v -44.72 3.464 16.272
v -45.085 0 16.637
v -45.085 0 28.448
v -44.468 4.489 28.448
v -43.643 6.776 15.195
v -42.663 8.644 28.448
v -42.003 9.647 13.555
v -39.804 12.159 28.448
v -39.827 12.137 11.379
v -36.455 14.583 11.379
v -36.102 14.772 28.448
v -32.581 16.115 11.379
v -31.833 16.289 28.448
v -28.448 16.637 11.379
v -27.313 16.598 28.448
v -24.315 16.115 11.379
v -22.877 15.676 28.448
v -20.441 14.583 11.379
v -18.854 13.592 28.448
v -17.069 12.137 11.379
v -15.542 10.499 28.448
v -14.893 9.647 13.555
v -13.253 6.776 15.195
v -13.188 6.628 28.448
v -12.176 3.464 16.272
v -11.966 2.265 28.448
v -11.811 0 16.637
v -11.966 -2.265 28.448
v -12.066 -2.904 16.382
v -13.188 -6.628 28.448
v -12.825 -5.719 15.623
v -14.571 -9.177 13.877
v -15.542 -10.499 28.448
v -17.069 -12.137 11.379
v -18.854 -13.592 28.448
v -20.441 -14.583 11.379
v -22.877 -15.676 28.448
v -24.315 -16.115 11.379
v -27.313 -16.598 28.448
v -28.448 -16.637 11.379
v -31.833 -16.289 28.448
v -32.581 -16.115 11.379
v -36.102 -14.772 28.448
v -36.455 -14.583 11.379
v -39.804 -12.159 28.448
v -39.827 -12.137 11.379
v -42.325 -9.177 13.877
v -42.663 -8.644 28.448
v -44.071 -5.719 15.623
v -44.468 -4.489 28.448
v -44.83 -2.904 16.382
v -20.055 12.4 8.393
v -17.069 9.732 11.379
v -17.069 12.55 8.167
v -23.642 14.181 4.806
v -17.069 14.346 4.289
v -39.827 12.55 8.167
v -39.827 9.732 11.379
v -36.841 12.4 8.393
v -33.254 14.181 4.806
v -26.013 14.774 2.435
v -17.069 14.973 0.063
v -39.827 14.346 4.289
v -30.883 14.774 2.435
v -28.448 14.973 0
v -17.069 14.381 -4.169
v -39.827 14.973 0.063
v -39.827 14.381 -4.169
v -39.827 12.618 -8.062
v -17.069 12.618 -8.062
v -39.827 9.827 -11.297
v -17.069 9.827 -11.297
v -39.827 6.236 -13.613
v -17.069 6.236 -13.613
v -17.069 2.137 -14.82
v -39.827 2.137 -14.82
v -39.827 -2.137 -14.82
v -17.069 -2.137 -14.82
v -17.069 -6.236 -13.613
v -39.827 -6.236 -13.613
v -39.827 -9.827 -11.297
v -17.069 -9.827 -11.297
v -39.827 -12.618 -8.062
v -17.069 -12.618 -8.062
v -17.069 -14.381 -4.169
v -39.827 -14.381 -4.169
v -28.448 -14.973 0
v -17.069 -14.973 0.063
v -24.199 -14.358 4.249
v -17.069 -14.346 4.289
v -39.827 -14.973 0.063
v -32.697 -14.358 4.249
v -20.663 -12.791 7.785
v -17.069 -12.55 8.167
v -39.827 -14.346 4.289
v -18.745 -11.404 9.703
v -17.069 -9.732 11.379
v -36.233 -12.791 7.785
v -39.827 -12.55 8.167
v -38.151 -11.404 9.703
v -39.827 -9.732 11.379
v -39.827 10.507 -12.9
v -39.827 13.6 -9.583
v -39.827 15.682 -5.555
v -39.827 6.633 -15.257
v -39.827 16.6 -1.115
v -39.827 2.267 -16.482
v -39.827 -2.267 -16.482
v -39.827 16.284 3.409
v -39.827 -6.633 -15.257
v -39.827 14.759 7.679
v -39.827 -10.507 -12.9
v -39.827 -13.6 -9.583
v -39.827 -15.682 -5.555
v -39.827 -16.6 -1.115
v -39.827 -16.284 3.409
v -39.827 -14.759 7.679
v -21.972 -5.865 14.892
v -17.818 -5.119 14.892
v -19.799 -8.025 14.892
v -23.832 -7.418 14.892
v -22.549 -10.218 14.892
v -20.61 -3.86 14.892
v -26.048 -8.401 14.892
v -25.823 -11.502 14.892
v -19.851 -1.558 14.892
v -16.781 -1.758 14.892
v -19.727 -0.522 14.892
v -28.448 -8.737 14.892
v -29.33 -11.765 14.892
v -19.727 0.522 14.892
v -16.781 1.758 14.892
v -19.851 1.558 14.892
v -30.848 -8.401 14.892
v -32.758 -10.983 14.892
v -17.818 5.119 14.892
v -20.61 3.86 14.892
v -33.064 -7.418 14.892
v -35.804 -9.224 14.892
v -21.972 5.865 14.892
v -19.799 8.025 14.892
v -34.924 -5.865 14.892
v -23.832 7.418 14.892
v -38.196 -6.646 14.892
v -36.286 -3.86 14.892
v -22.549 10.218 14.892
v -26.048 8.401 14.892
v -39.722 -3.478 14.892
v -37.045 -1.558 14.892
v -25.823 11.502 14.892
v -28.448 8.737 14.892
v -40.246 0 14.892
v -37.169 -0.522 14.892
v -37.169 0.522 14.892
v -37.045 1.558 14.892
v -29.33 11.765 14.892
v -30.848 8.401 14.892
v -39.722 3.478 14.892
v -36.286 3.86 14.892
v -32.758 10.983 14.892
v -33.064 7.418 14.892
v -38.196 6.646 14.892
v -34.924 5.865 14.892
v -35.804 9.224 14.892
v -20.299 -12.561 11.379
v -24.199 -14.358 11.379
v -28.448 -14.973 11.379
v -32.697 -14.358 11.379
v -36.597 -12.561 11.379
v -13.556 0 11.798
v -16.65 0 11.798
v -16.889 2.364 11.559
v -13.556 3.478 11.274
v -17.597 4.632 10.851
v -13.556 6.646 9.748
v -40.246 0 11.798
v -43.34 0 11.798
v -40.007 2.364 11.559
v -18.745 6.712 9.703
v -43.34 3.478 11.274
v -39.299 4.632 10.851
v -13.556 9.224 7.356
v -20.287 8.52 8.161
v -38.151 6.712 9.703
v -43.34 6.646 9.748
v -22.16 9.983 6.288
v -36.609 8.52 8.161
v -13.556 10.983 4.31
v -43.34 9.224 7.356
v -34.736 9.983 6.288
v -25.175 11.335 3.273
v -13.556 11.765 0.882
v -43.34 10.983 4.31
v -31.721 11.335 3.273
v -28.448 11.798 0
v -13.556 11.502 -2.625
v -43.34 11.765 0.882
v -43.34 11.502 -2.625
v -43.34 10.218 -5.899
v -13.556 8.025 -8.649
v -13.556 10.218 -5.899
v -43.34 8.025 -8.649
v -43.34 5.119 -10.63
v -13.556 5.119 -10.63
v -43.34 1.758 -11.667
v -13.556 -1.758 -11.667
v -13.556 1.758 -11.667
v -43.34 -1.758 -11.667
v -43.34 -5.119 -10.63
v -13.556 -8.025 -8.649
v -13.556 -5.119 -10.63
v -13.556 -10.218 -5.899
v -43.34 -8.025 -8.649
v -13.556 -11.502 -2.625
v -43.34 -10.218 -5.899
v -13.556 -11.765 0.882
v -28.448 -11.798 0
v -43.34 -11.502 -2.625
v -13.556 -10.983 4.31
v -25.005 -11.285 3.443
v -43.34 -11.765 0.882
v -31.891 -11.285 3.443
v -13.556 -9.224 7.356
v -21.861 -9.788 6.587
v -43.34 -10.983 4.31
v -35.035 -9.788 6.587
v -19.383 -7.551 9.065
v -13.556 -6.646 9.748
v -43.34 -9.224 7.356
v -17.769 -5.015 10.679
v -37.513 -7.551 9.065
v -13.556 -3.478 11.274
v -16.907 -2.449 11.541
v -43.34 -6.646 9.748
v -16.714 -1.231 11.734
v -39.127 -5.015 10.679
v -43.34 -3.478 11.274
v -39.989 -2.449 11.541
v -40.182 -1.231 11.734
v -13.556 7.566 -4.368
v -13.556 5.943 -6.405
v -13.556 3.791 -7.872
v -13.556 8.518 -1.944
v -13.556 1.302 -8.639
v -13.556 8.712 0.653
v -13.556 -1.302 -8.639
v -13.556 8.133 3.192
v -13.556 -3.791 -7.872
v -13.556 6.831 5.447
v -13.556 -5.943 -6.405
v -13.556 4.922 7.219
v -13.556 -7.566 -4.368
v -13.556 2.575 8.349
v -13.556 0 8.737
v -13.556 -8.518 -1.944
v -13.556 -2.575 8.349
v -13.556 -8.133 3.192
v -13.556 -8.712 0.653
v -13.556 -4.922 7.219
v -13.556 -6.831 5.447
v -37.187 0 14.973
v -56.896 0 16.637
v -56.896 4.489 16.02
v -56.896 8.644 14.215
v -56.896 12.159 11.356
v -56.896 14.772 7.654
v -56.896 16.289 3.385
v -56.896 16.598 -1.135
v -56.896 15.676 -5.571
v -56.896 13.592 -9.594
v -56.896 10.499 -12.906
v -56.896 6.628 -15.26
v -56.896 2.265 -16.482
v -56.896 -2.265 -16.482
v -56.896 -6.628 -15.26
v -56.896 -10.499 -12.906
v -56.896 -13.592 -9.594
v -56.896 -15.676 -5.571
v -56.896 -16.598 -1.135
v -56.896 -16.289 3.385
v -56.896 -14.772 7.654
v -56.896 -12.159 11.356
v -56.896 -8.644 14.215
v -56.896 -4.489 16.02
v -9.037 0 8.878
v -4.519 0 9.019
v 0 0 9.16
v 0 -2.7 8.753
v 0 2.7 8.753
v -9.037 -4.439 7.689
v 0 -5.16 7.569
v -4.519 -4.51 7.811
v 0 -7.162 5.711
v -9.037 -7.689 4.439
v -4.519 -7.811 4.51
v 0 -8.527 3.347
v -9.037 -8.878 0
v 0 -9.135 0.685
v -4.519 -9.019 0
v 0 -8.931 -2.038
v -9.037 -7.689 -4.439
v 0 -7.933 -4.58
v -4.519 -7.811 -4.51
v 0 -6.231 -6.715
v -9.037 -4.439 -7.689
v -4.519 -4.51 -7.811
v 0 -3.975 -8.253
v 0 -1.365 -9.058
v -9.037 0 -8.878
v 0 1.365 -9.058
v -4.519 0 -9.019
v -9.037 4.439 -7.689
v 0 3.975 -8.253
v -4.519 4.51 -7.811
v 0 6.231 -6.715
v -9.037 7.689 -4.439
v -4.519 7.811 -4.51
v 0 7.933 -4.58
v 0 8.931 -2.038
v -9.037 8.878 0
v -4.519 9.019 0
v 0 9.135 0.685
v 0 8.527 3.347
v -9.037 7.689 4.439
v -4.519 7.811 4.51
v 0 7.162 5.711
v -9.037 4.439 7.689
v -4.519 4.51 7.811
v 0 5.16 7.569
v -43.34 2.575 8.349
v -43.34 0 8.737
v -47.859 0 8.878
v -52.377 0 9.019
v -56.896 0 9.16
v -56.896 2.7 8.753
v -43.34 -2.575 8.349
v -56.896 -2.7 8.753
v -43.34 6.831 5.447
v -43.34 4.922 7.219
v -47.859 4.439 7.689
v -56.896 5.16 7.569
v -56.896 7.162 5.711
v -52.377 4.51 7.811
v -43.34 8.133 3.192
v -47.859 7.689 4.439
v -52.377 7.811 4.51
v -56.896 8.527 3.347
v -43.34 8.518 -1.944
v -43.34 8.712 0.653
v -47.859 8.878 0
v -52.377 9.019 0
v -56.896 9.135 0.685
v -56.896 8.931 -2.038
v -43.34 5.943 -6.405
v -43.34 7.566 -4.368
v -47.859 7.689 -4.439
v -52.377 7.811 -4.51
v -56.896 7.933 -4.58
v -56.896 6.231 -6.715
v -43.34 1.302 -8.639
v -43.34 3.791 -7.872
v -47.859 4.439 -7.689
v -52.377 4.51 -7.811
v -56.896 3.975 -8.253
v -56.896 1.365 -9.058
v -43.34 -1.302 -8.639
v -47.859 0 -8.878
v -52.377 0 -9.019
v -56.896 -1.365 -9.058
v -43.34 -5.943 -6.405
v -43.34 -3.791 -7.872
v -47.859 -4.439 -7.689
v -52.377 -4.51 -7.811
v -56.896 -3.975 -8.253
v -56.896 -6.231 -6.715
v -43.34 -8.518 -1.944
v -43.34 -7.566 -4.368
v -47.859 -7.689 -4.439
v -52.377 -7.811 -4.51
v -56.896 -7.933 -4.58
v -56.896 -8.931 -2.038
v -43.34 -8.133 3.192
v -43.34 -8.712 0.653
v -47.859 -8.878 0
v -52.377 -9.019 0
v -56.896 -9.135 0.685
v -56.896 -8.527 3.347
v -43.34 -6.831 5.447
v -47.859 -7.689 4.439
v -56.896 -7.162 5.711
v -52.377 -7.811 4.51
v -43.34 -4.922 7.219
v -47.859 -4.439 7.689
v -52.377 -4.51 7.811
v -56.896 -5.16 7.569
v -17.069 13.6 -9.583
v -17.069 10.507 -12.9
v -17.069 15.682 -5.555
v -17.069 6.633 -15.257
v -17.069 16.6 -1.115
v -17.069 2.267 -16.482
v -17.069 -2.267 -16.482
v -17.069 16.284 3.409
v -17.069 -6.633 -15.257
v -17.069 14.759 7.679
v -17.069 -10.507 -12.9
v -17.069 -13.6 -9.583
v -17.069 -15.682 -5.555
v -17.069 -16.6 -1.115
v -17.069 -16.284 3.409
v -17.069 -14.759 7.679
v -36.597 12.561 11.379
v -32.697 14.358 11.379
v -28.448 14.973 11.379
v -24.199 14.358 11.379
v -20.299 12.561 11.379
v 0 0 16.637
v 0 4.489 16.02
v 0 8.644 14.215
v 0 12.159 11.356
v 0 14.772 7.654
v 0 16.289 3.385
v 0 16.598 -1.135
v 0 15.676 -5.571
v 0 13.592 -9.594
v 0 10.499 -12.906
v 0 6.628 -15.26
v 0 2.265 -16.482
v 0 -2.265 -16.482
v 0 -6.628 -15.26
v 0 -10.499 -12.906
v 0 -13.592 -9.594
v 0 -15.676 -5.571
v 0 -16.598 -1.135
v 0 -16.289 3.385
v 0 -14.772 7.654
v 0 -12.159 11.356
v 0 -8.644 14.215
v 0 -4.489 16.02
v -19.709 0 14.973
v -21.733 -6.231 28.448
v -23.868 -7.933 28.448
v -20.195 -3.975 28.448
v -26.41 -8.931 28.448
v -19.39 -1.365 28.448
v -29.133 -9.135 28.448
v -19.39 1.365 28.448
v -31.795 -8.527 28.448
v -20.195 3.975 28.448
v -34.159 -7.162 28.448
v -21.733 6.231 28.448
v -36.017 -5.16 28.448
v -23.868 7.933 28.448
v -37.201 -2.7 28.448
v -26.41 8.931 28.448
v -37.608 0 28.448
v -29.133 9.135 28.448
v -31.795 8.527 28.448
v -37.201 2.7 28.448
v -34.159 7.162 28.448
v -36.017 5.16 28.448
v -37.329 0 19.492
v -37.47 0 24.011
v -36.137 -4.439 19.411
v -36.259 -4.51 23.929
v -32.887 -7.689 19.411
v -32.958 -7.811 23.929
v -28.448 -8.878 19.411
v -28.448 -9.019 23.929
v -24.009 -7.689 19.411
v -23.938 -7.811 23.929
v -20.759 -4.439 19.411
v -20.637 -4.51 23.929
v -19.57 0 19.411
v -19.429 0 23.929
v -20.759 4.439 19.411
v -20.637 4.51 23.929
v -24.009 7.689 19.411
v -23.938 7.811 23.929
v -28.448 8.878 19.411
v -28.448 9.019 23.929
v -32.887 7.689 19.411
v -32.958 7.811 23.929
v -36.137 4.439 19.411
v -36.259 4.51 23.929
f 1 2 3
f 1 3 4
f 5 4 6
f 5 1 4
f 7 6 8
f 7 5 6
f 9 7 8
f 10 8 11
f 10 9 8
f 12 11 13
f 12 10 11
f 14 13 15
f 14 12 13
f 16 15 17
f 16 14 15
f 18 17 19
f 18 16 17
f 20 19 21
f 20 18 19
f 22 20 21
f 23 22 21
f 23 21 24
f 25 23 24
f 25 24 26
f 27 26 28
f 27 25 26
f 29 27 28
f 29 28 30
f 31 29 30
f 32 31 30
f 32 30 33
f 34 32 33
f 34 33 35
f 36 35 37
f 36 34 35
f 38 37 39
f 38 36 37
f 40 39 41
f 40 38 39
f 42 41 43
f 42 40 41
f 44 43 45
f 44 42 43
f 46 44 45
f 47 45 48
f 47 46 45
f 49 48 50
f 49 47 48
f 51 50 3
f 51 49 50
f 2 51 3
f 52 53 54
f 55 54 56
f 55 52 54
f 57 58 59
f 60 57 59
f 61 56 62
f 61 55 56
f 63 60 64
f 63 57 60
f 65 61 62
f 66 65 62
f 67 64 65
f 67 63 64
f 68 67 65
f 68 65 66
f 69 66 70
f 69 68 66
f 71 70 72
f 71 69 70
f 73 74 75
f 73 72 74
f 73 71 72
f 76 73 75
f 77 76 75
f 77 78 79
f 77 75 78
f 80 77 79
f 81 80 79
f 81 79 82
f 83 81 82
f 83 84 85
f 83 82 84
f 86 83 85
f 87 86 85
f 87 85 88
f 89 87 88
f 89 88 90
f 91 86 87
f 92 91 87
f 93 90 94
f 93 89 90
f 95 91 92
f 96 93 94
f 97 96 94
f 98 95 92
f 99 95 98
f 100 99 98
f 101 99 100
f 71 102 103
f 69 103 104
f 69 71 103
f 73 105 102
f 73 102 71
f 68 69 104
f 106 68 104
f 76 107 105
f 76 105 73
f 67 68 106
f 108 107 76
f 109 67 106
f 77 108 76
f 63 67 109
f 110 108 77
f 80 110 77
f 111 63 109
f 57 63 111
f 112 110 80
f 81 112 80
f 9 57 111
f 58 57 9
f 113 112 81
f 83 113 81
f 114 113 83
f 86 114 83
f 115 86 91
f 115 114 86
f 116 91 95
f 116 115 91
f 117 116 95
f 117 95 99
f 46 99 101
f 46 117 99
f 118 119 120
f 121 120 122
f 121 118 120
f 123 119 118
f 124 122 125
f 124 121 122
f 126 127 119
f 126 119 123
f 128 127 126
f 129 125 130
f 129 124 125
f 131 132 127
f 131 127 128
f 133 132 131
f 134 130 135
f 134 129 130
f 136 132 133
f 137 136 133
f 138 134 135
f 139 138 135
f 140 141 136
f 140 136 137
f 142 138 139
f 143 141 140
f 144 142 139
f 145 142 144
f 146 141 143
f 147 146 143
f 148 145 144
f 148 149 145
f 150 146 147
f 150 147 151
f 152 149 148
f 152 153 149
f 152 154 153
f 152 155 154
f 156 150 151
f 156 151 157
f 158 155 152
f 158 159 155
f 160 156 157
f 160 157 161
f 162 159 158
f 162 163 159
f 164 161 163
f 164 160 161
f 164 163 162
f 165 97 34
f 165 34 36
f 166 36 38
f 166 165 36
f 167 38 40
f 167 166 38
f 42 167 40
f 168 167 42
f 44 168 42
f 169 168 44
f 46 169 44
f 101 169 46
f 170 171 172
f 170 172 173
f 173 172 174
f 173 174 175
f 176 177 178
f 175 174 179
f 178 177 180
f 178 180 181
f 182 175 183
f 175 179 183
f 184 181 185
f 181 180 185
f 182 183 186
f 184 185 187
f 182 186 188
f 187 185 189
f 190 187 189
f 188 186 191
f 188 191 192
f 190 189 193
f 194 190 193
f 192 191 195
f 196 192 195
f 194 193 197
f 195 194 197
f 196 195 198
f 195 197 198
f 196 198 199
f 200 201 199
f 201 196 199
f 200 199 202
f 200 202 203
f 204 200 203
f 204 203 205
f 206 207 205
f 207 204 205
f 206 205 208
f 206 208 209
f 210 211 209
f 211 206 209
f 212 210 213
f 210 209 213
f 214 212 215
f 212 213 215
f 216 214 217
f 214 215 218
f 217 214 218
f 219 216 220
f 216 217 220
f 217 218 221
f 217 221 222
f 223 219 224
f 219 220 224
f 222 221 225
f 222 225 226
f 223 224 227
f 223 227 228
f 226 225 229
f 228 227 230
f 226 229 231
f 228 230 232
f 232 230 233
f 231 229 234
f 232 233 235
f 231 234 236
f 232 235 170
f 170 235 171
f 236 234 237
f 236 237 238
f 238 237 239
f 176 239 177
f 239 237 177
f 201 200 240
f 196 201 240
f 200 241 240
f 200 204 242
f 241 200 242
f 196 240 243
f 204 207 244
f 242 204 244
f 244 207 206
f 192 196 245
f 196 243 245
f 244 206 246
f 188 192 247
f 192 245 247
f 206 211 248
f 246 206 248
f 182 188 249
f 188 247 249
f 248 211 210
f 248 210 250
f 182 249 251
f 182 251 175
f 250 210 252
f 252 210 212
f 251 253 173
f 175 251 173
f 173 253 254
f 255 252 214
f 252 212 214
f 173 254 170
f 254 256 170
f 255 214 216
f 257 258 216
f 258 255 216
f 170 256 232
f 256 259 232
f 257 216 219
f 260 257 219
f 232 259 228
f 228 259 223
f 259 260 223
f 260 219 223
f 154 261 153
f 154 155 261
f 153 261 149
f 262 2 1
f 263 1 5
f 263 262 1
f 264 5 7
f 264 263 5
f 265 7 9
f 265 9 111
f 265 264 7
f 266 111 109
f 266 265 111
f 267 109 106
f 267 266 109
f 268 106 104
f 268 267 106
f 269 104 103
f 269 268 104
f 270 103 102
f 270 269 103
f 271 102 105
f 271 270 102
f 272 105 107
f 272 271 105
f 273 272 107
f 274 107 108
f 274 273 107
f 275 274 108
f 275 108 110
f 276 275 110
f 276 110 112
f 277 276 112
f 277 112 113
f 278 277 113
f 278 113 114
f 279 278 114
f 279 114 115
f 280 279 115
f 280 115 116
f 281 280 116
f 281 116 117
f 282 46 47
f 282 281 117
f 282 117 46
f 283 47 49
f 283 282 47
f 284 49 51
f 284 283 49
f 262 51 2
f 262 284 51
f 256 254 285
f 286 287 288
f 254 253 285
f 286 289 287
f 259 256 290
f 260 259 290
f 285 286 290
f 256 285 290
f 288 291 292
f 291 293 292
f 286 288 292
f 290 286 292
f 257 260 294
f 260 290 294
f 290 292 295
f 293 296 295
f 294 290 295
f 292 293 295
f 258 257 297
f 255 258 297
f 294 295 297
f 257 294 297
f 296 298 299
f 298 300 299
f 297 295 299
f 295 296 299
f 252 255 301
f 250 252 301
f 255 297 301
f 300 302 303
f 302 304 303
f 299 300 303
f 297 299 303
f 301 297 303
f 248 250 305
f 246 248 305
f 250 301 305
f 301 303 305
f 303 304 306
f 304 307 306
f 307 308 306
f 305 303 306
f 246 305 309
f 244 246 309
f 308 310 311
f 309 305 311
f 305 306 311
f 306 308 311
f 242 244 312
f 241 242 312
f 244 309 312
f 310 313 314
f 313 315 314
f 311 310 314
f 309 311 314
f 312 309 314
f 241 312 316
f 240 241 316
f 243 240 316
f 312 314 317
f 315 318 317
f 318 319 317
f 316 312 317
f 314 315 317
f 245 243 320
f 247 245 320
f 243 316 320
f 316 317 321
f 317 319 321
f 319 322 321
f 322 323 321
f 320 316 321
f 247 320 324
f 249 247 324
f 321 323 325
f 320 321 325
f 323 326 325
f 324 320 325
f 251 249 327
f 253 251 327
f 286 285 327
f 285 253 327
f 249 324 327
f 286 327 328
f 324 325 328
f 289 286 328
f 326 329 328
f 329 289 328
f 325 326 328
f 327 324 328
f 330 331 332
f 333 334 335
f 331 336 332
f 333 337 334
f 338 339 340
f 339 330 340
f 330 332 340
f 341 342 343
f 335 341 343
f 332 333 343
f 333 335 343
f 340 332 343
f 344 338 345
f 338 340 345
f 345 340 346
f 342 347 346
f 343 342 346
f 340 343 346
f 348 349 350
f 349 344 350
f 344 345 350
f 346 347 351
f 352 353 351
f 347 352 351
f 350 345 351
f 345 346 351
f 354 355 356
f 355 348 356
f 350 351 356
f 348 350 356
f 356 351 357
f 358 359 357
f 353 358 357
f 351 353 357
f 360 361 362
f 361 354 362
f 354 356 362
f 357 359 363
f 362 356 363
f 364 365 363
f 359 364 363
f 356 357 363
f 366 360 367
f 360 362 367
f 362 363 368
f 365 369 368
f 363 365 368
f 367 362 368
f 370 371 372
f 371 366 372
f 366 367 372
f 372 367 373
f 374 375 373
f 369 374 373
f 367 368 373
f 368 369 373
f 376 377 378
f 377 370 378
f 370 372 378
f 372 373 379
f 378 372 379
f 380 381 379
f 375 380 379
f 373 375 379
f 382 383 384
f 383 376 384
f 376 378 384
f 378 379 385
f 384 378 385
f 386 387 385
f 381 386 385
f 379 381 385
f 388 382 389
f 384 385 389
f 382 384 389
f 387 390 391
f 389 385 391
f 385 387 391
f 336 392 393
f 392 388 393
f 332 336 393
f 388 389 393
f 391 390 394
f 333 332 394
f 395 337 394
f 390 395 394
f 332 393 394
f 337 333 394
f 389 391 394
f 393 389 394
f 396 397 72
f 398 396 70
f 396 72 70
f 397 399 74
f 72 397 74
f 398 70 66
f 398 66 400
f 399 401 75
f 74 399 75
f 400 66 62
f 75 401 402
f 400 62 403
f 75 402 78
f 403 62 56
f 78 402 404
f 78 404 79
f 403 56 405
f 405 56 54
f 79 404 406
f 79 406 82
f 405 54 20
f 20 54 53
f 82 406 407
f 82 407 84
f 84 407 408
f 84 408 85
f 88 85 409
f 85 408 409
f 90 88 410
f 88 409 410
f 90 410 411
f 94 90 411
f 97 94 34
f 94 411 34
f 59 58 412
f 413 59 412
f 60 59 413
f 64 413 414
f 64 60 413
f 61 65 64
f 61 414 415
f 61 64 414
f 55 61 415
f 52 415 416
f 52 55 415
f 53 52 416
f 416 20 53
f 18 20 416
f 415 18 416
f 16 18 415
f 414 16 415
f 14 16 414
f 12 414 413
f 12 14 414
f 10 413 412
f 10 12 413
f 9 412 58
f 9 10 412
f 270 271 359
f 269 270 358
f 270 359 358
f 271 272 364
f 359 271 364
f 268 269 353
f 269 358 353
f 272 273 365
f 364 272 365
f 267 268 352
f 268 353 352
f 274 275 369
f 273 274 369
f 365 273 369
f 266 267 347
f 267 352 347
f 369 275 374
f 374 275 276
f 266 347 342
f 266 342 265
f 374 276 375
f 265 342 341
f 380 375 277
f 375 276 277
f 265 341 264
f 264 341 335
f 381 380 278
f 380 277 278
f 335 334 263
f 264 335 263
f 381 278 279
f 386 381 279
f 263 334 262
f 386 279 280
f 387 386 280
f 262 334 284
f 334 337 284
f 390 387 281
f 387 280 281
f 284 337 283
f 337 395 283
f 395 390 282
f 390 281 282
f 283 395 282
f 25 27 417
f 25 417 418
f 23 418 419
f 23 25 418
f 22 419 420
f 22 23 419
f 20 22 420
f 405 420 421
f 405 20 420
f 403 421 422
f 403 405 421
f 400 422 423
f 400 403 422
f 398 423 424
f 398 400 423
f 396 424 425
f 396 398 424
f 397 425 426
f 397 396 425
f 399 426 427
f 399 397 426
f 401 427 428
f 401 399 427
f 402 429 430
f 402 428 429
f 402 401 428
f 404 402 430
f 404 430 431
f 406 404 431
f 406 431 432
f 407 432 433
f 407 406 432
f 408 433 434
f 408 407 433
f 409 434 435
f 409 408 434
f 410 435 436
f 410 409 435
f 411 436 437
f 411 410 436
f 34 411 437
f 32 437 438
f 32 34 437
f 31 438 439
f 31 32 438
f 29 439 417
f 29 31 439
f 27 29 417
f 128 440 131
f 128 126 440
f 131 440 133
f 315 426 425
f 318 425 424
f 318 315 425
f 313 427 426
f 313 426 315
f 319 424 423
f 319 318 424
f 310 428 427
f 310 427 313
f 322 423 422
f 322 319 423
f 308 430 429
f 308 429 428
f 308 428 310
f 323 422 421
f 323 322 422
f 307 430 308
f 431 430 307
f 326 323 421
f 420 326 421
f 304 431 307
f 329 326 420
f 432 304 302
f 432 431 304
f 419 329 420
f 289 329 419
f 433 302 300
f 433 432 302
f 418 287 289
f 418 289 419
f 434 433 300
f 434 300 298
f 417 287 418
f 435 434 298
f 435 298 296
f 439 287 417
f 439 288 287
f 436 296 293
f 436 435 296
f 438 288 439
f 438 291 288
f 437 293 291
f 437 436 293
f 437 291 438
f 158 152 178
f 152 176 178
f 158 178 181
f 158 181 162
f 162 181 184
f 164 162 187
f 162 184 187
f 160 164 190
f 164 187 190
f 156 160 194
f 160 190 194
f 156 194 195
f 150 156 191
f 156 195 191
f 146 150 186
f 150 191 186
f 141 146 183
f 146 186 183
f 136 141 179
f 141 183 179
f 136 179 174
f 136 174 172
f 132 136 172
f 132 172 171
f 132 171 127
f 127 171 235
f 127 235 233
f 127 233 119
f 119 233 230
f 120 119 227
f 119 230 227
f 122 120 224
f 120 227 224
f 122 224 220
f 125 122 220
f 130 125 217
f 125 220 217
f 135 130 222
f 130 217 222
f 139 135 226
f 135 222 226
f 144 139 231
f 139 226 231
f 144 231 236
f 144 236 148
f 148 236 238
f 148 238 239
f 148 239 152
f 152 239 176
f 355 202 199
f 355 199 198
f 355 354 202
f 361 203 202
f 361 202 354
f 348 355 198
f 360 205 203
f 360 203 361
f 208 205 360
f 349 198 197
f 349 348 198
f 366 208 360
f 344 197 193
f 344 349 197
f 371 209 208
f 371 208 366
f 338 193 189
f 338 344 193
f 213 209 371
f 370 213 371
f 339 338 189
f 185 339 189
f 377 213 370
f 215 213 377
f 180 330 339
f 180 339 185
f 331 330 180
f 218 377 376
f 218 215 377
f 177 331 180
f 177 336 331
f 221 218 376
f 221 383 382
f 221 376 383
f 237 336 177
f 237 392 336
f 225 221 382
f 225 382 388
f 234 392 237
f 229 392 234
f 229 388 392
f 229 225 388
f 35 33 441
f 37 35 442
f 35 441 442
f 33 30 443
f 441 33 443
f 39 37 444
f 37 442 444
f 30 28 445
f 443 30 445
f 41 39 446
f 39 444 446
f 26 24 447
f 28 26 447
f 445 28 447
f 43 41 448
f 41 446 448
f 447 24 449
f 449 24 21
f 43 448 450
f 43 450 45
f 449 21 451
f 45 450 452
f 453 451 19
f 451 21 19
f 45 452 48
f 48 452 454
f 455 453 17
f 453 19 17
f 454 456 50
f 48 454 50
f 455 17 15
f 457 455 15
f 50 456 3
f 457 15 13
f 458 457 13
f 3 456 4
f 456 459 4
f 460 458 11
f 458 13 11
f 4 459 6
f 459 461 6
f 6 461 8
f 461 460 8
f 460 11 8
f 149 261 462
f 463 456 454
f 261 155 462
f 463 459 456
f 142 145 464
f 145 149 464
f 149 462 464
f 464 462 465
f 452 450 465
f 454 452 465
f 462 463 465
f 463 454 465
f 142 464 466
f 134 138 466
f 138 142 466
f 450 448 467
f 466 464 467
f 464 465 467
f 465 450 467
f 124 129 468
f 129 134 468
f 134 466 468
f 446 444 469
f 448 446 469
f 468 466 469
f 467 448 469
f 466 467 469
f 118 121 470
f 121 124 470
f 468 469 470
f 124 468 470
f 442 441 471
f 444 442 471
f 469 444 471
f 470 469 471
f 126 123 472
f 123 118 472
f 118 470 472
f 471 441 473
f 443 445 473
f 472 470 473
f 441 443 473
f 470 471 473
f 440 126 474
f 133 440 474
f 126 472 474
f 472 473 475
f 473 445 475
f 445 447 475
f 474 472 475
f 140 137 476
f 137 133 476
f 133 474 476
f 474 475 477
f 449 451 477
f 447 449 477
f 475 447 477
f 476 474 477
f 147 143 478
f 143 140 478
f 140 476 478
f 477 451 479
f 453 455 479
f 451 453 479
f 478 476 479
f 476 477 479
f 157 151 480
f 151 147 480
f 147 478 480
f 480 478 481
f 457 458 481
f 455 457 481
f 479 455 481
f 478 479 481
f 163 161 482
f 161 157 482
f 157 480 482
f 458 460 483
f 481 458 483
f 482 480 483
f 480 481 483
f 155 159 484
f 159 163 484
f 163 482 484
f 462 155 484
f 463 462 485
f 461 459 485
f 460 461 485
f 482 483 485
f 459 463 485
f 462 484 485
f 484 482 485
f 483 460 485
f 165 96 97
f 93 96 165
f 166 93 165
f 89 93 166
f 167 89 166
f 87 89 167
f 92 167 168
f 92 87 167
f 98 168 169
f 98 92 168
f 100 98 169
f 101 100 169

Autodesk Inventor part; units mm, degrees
ref_plane "YZ Plane" through (0, 0, 0) normal (1, 0, 0) x (0, 1, 0)
ref_plane "XZ Plane" through (0, 0, 0) normal (0, 1, 0) x (-1, 0, 0)
ref_plane "XY Plane" through (0, 0, 0) normal (0, 0, 1) x (1, 0, 0)
sketch "Sketch1" plane through (0, 0, 0) normal (0, 1, 0) x (-1, 0, 0)
  line L0 (0, 16.637) -> (17.0688, 16.637)
  line L1 (17.0688, 16.637) -> (17.0688, 14.9733)
  line L2 (39.8272, 14.9733) -> (39.8272, 16.637)
  line L3 (39.8272, 16.637) -> (56.896, 16.637)
  line L4 (56.896, 16.637) -> (56.896, 9.1604)
  line L5 (56.896, 9.1604) -> (56.896, 0)
  line L6 (56.896, 0) -> (0, 0)
  line L7 (0, 0) -> (0, 9.1604)
  line L8 (0, 9.1604) -> (13.556, 8.7368)
  line L9 (13.556, 8.7368) -> (13.556, 11.7983)
  line L10 (56.896, 9.1604) -> (43.34, 8.7368)
  line L11 (43.34, 8.7368) -> (43.34, 11.7983)
  line L12 (0, 9.1604) -> (0, 16.637)
  line L13 (17.0688, 16.637) -> (28.448, 16.637) construction
  line L14 (28.448, 16.637) -> (39.8272, 16.637) construction
  line L15 (28.448, 16.637) -> (28.448, 0) construction
  line L16 (17.0688, 14.9733) -> (28.448, 14.9733)
  line L17 (28.448, 14.9733) -> (39.8272, 14.9733)
  line L18 (13.556, 11.7983) -> (28.448, 11.7983)
  line L19 (28.448, 11.7983) -> (43.34, 11.7983)
  line L20 (37.6084, 28.448) -> (45.085, 28.448)
  line L21 (45.085, 28.448) -> (45.085, 11.3792)
  line L22 (45.085, 11.3792) -> (43.4213, 11.3792)
  line L23 (43.4213, 11.3792) -> (43.4213, 0)
  line L24 (43.4213, 0) -> (40.2463, 0)
  line L25 (37.6084, 28.448) -> (37.1848, 14.892)
  line L26 (37.6084, 28.448) -> (28.448, 28.448)
  line L27 (40.2463, 0) -> (28.448, 0)
  line L28 (28.448, 28.448) -> (28.448, 0) construction
  line L29 (37.1848, 14.892) -> (40.2463, 14.892)
  line L30 (40.2463, 14.892) -> (40.2463, 0)
  line L31 (13.556, 11.7983) -> (13.556, 0)
  line L32 (43.34, 11.7983) -> (43.34, 0)
  line L33 (40.2463, 14.892) -> (28.448, 14.892)
  line L34 (28.448, 14.892) -> (28.448, 0)
  line L35 (28.448, 28.448) -> (28.448, 14.892)
  dimension "d0" = 18.3208
  dimension "d1" = 33.274
  dimension "d2" = 17.0688
  dimension "d3" = 28.448
  dimension "d4" = 13.556
  dimension "d5" = 23.5966
  dimension "d6" = 3.175
  dimension "d7" = 1.79
  dimension "d8" = 28.448
  dimension "d9" = 17.0688
  dimension "d10" = 33.274
  dimension "d12" = 18.3208
  dimension "d13" = 23.5966
  dimension "d14" = 13.556
  dimension "d15" = 1.79
  dimension "d16" = 3.175
revolve "Revolve1" add sketch "Sketch1" angle 360 about axis through (-56.896, 0, 0) along (1, 0, 0) contours L0 L1 L16 L35 L34 L18 L9 L8 L12 | L8 L31 L6 L7 | L9 L18 L34 L6 L31 | L17 L25 L33 L35 | L17 L2 L3 L21 L22 L23 L10 L11 L19 L30 L29 L25 | L33 L29 L30 L19 L34 | L34 L19 L30 L6 | L30 L19 L11 L32 L6 | L32 L10 L23 L6 | L3 L4 L10 L23 L22 L21 | L23 L10 L5 L6
revolve "Revolve2" add sketch "Sketch1" angle 360 about axis through (-28.448, 0, 28.448) along (0, 0, -1) contours L25 L20 L21 L3 L2 L17 | L17 L2 L3 L21 L22 L23 L10 L11 L19 L30 L29 L25 | L33 L29 L30 L19 L34 | L34 L19 L30 L6 | L30 L19 L11 L32 L6 | L32 L10 L23 L6
revolve "Revolve3" cut sketch "Sketch1" angle 360 about axis through (-56.896, 0, 0) along (1, 0, 0) contours L8 L31 L6 L7 | L9 L18 L34 L6 L31 | L34 L19 L30 L6 | L30 L19 L11 L32 L6 | L32 L10 L23 L6 | L23 L10 L5 L6
revolve "Revolve4" cut sketch "Sketch1" angle 360 about axis through (-28.448, 0, 28.448) along (0, 0, -1) contours L35 L26 L25 L17 | L17 L25 L33 L35 | L33 L29 L30 L19 L34 | L34 L19 L30 L6
thread "Thread1" size "1/2" designation "1/2 - 14 NPT" standard "NPT" full length
thread "Thread2" size "1/2" designation "1/2 - 14 NPT" standard "NPT" full length
thread "Thread3" size "1/2" designation "1/2 - 14 NPT" standard "NPT" full length
equation "\"d0\" = MD"
equation "\"d1\" = H"
equation "\"d2\" = 0.6 * A"
equation "\"d3\" = A"
equation "\"d4\" = L2"
equation "\"d5\" = 0.9 * H - 2 * G"
equation "\"d6\" = G"
equation "\"d8\" = A"
equation "\"d9\" = 0.6 * A"
equation "\"d10\" = H"
equation "\"d12\" = MD"
equation "\"d13\" = 0.9 * H - 2 * G"
equation "\"d14\" = L2"
equation "\"d16\" = G"
equation "\"A\" = 28.448"
equation "\"L2\" = 13.55598"
equation "\"G\" = 3.175"
equation "\"H\" = 33.274"
equation "\"MD\" = 18.32077"
equation "\"Size_Designation\" = 0.5"
properties part number "ASME B16.11 Tee Threaded - Class 2000 1/2" material "Steel"
